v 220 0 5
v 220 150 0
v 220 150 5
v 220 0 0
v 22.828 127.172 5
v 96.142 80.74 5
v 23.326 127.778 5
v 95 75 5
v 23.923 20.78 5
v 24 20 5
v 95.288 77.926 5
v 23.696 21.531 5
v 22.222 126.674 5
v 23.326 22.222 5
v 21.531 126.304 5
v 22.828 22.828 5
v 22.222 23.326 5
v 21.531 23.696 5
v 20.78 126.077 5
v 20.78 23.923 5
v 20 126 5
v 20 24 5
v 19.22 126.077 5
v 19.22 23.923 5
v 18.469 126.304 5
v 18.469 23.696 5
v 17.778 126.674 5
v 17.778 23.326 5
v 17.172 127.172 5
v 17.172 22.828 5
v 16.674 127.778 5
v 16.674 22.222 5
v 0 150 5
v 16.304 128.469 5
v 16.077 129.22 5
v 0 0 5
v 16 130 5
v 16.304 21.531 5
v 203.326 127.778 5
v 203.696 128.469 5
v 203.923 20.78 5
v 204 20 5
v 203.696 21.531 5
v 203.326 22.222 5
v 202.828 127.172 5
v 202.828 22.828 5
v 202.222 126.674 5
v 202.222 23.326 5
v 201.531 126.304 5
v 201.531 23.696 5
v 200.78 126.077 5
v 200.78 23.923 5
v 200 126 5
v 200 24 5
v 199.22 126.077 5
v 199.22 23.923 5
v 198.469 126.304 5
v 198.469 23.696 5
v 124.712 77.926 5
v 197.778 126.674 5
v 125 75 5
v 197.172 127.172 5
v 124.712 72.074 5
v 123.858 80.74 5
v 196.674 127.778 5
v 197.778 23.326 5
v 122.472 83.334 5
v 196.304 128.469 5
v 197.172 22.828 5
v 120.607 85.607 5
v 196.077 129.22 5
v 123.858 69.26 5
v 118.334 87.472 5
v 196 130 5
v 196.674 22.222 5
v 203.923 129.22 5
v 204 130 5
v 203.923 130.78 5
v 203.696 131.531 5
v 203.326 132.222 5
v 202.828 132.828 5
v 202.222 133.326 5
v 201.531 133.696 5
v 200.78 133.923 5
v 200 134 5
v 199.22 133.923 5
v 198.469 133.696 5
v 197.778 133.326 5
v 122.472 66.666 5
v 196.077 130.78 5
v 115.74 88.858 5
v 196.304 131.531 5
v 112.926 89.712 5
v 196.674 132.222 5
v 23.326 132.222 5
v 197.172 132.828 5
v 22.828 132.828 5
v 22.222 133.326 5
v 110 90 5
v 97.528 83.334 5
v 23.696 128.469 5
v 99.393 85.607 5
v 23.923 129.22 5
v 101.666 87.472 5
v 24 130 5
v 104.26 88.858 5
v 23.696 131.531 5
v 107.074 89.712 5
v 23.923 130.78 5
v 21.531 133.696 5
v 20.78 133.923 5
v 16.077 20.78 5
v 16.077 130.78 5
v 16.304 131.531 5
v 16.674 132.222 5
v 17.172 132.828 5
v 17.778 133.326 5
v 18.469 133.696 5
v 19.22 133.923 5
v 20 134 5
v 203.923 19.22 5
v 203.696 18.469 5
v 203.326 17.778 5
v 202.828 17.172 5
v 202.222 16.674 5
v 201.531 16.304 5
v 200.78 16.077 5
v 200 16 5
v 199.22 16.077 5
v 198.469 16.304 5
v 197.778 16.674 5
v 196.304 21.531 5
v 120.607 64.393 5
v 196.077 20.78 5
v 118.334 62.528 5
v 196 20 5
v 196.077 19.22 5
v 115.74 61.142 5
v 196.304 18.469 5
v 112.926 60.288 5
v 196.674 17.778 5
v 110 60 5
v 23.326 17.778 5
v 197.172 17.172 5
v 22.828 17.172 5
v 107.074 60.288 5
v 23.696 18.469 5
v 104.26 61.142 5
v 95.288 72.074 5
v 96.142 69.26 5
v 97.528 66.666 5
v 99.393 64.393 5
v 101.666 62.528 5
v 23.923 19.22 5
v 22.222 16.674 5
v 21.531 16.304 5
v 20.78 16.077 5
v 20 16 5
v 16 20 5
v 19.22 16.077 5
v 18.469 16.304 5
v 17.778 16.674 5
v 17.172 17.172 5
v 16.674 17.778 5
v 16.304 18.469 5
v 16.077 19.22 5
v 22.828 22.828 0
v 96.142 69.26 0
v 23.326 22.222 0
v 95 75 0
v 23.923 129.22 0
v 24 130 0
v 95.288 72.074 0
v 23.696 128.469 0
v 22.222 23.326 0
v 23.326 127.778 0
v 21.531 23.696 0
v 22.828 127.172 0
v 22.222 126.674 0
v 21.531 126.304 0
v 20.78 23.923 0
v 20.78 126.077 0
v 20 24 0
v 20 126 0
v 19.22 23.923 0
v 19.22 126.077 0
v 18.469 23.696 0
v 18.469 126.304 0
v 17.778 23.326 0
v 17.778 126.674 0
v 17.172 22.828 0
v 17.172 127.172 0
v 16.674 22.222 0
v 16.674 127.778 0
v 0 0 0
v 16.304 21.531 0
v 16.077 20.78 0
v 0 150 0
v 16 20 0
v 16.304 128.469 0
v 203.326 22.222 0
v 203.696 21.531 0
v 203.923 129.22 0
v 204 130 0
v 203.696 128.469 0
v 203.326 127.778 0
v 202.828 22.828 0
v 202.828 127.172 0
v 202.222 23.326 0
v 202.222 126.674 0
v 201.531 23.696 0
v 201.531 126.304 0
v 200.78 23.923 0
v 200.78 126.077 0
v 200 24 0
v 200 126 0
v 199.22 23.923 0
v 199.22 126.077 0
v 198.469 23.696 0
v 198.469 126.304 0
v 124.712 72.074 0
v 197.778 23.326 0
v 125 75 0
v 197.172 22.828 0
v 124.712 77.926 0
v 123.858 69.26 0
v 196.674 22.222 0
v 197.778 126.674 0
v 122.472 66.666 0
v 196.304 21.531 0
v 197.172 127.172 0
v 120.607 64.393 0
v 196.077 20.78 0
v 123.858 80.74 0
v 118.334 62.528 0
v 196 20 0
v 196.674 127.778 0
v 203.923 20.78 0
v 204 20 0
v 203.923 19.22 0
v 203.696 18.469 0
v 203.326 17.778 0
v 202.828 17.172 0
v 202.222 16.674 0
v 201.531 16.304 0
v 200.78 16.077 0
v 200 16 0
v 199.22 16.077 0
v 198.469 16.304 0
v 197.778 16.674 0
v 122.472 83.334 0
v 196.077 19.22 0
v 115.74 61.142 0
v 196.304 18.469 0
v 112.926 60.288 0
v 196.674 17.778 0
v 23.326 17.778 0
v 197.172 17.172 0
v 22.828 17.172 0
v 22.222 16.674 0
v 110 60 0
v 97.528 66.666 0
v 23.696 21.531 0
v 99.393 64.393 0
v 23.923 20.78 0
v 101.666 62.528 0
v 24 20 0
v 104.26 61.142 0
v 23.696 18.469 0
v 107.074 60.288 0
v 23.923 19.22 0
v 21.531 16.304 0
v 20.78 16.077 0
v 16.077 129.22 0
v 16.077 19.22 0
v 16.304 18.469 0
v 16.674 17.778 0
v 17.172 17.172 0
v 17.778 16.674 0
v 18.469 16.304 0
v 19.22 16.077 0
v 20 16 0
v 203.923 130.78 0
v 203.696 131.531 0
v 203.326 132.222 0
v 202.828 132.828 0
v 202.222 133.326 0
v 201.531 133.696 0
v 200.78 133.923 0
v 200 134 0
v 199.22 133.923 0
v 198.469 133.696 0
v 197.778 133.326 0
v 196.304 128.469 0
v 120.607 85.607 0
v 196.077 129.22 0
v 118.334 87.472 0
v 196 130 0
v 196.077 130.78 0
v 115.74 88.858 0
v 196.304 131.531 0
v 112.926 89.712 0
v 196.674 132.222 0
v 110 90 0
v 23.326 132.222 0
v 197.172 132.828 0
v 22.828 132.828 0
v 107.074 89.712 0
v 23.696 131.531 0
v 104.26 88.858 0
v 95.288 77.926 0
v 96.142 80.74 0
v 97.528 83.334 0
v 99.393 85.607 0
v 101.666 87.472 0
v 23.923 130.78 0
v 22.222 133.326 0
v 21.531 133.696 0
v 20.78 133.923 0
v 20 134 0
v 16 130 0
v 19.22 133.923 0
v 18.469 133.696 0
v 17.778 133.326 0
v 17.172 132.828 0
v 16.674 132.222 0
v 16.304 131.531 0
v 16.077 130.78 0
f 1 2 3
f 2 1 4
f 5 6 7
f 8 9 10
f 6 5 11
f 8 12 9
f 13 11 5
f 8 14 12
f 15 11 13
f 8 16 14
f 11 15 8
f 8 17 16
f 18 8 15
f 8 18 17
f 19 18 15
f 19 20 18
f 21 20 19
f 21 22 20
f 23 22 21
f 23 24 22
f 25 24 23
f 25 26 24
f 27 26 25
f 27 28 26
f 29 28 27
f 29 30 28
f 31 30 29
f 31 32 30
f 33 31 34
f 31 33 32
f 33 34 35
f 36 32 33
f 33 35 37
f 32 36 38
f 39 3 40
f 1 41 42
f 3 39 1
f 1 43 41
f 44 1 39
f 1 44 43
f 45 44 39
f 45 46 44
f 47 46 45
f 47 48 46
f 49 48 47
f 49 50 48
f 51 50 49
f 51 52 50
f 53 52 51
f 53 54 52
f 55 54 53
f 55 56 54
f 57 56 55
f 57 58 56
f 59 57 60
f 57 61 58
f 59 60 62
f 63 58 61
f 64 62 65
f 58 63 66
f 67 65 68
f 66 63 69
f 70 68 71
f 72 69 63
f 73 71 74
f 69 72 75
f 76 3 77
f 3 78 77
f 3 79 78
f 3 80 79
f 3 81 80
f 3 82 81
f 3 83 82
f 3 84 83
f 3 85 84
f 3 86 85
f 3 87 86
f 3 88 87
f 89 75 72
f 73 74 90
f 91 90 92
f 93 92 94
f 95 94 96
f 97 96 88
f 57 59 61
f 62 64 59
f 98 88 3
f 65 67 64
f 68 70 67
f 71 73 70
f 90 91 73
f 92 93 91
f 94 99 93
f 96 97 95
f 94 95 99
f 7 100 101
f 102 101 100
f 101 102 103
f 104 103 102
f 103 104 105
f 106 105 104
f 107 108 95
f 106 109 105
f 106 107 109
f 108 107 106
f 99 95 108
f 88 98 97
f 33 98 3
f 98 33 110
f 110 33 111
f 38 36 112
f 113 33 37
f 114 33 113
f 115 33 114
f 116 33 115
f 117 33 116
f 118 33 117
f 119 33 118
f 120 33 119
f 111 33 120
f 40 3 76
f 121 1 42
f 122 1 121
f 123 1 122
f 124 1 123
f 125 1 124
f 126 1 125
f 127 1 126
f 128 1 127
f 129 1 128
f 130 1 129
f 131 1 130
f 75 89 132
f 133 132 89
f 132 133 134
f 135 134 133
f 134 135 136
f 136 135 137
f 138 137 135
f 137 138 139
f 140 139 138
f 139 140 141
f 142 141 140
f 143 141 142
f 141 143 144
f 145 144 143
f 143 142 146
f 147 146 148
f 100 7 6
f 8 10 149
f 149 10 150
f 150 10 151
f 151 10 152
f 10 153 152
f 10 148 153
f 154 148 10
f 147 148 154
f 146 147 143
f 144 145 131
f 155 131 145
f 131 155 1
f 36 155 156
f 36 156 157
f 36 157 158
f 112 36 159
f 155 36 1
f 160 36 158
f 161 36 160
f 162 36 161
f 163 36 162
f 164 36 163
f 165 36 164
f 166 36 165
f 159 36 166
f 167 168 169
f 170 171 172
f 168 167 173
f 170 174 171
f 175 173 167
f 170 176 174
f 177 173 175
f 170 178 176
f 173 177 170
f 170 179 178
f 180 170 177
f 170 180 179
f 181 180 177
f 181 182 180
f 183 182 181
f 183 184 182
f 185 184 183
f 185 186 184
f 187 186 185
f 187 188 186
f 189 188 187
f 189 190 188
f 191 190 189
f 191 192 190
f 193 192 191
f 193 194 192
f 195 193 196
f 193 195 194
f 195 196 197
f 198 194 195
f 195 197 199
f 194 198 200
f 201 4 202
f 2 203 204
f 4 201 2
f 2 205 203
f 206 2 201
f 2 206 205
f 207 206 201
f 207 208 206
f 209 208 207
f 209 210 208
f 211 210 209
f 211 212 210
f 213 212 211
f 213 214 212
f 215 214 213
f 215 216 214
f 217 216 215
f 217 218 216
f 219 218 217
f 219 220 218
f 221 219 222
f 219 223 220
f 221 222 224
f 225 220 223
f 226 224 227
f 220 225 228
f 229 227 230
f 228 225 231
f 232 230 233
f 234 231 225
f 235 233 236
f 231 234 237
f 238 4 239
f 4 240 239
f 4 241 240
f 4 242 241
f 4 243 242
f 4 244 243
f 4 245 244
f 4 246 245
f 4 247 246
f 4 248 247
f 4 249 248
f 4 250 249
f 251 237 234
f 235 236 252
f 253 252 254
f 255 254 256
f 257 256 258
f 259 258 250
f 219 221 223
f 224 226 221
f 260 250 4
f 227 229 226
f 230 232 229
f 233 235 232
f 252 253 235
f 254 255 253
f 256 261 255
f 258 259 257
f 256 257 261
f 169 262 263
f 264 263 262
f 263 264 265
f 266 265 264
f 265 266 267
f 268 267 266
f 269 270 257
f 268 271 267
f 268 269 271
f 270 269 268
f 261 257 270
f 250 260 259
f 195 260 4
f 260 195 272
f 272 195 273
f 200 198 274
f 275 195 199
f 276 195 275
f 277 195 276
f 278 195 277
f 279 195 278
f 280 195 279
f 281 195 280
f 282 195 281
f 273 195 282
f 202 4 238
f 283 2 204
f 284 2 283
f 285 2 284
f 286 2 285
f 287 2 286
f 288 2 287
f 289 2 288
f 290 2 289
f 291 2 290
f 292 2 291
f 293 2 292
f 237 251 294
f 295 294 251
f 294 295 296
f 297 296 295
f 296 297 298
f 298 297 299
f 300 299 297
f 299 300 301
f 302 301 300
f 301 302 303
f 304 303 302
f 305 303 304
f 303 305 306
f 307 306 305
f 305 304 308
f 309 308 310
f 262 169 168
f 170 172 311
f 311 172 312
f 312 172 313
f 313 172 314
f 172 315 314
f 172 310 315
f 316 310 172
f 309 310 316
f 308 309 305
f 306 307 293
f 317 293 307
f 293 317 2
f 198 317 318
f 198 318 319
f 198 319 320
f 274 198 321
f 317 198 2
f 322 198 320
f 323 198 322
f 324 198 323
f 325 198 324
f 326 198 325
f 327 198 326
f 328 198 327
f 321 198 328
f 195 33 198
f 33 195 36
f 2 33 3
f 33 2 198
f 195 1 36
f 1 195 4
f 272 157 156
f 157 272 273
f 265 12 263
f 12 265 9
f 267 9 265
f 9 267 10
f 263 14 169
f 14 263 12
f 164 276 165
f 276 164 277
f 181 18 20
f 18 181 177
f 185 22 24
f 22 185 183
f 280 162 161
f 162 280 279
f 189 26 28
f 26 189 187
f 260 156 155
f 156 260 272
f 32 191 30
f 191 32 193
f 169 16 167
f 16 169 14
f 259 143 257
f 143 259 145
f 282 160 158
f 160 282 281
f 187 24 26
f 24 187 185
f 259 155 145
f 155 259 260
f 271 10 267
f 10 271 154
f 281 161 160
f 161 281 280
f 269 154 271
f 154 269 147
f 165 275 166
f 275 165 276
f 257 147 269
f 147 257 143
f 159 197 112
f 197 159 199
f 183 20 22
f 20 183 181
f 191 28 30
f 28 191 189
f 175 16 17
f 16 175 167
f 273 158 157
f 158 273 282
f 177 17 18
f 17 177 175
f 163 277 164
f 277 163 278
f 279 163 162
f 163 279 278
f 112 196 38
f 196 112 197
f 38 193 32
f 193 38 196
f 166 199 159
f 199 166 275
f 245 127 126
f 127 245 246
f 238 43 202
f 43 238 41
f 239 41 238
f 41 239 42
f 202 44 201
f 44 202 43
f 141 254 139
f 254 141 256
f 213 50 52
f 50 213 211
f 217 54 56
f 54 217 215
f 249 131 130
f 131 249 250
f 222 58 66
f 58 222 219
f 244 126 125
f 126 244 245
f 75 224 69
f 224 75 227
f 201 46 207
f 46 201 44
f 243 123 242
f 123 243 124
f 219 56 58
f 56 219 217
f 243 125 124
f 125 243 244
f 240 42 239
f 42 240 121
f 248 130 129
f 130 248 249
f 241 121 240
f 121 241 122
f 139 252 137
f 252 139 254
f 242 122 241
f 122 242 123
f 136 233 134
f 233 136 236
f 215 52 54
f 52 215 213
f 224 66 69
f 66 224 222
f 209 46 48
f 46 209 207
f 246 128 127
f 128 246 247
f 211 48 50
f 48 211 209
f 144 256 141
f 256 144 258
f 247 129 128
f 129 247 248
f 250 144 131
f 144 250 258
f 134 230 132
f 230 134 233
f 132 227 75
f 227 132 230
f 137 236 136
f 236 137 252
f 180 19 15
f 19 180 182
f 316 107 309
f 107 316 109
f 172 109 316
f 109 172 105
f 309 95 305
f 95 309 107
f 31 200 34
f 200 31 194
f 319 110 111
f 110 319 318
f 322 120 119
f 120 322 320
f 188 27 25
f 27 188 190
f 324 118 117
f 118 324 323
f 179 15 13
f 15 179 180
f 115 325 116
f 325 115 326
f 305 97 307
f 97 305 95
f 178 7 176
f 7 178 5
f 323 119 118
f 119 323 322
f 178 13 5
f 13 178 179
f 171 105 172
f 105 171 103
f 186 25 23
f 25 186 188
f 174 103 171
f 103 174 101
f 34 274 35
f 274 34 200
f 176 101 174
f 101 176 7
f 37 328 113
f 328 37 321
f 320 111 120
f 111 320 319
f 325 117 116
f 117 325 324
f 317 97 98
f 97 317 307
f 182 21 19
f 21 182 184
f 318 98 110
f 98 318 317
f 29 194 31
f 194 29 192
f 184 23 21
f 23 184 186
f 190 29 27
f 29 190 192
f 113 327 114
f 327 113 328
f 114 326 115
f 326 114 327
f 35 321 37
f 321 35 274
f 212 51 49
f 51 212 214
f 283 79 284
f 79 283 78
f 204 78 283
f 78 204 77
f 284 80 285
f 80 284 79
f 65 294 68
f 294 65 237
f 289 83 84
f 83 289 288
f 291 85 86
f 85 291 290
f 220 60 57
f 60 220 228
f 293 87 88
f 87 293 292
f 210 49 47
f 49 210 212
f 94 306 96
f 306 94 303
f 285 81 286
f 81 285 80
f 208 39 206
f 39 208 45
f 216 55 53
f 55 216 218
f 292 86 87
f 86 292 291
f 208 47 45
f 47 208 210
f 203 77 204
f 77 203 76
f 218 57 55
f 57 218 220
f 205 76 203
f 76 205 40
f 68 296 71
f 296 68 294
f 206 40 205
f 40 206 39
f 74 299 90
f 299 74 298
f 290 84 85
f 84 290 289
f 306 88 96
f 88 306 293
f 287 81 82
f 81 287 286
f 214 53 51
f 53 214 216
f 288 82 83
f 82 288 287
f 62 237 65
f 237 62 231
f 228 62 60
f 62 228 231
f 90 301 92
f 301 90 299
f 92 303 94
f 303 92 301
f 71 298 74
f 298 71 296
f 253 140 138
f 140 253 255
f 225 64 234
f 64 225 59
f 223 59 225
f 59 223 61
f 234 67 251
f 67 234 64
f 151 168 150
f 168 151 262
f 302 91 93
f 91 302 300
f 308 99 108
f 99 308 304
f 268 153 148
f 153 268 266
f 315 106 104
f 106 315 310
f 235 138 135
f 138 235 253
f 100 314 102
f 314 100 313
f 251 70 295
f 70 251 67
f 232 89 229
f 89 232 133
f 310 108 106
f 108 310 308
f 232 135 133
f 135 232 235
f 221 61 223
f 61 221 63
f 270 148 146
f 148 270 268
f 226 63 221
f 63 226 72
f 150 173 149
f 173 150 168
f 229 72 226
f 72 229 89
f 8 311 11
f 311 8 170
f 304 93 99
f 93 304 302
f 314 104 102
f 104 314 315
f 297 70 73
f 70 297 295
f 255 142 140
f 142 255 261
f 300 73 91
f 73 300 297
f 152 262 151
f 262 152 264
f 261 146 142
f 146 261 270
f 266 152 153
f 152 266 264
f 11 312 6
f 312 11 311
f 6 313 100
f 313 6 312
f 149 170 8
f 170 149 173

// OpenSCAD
$fn = 32;

// ----------------------------------------------------------------------
// Big plate: 200-250 mm adapter plate
// ----------------------------------------------------------------------

// --- parameters (mm) ---
plate_l = 220;            // plate length, X
plate_w = 150;            // plate width, Y
plate_t = 5;              // plate thickness, Z
corner_d = 8;             // corner hole diameter
corner_in = 20;           // corner hole inset from the edges
bore_d = 30;              // central bore

difference() {
  cube([plate_l, plate_w, plate_t]);
  translate([corner_in, corner_in, -1]) cylinder(h = plate_t + 2, d = corner_d);
  translate([plate_l - corner_in, corner_in, -1]) cylinder(h = plate_t + 2, d = corner_d);
  translate([corner_in, plate_w - corner_in, -1]) cylinder(h = plate_t + 2, d = corner_d);
  translate([plate_l - corner_in, plate_w - corner_in, -1]) cylinder(h = plate_t + 2, d = corner_d);
  translate([plate_l / 2, plate_w / 2, -1]) cylinder(h = plate_t + 2, d = bore_d);
}
